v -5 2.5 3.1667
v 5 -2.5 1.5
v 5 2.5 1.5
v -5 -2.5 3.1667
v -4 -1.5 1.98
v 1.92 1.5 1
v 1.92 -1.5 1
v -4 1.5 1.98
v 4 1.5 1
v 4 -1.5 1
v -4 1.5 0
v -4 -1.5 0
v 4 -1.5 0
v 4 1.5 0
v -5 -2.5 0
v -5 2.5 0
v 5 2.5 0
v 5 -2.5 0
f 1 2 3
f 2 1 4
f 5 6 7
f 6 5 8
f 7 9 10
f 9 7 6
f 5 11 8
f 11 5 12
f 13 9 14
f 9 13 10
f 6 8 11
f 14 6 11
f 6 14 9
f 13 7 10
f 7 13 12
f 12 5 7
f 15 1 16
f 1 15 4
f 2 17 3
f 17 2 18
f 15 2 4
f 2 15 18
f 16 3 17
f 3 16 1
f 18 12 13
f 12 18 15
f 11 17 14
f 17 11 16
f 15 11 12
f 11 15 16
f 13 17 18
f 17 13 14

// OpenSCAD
// file: ../p/rect3.scad
use <../lib.scad>
function ldraw_lib__rect3() = [
// 0 Rectangle with 3 Edges
// 0 Name: rect3.dat
// 0 Author: Mark Kennedy [mkennedy]
// 0 !LDRAW_ORG Primitive UPDATE 2010-01
// 0 !LICENSE Licensed under CC BY 4.0 : see CAreadme.txt
// 
// 0 BFC CERTIFY CCW
  [0,"BFC","CERTIFY"],
  [0,"BFC","CCW"],
// 
// 0 !HISTORY 2003-08-01 [PTadmin] Official Update 2003-02
// 0 !HISTORY 2007-06-24 [PTadmin] Header formatted for Contributor Agreement
// 0 !HISTORY 2008-07-01 [PTadmin] Official Update 2008-01
// 0 !HISTORY 2010-01-17 [mikeheide] Change winding to CCW
// 0 !HISTORY 2010-04-05 [PTadmin] Official Update 2010-01
// 
// 
// 2 24 1 0 1 -1 0 1
  [2,24,1,0,1,-1,0,1],
// 2 24 1 0 1 1 0 -1
  [2,24,1,0,1,1,0,-1],
// 2 24 -1 0 1 -1 0 -1
  [2,24,-1,0,1,-1,0,-1],
// 4 16 -1 0 1 -1 0 -1 1 0 -1 1 0 1
  [4,16,-1,0,1,-1,0,-1,1,0,-1,1,0,1],
// 0 //
];
module ldraw_lib__rect3(step=0, col=false, unit=2/5, alt=false, line=0.2, solid=!$preview)
    makepoly(ldraw_lib__rect3(), step=step, col=col, unit=unit, alt=alt, line=line, solid=solid);
ldraw_lib__rect3(line=0.2);
// file: ../p/rect.scad
use <../lib.scad>
function ldraw_lib__rect() = [
// 0 Rectangle
// 0 Name: rect.dat
// 0 Author: James Jessiman
// 0 !LDRAW_ORG Primitive UPDATE 2010-01
// 0 !LICENSE Licensed under CC BY 4.0 : see CAreadme.txt
// 
// 0 BFC CERTIFY CCW
  [0,"BFC","CERTIFY"],
  [0,"BFC","CCW"],
// 
// 0 !HISTORY 2002-04-05 [hafhead] Added BFC statement
// 0 !HISTORY 2002-04-25 [PTadmin] Official Update 2002-02
// 0 !HISTORY 2007-06-24 [PTadmin] Header formatted for Contributor Agreement
// 0 !HISTORY 2008-07-01 [PTadmin] Official Update 2008-01
// 0 !HISTORY 2010-01-17 [mikeheide] changed winding to CCW
// 0 !HISTORY 2010-04-05 [PTadmin] Official Update 2010-01
// 
// 
// 2 24 1 0 1 -1 0 1
  [2,24,1,0,1,-1,0,1],
// 2 24 -1 0 1 -1 0 -1
  [2,24,-1,0,1,-1,0,-1],
// 2 24 -1 0 -1 1 0 -1
  [2,24,-1,0,-1,1,0,-1],
// 2 24 1 0 -1 1 0 1
  [2,24,1,0,-1,1,0,1],
// 4 16 -1 0 1 -1 0 -1 1 0 -1 1 0 1
  [4,16,-1,0,1,-1,0,-1,1,0,-1,1,0,1],
// 0
];
module ldraw_lib__rect(step=0, col=false, unit=2/5, alt=false, line=0.2, solid=!$preview)
    makepoly(ldraw_lib__rect(), step=step, col=col, unit=unit, alt=alt, line=line, solid=solid);
ldraw_lib__rect(line=0.2);
// main file
use <../lib.scad>
use <../p/rect.scad>
use <../p/rect3.scad>
function ldraw_lib__u7034() = [
// 0 Modulex Slope Brick  9  2 x  1 x  0.5
// 0 Name: u7034.dat
// 0 Author: Magnus Forsberg [MagFors]
// 0 !LDRAW_ORG Part UPDATE 2025-09
// 0 !LICENSE Licensed under CC BY 4.0 : see CAreadme.txt
// 
// 0 BFC CERTIFY CCW
  [0,"BFC","CERTIFY"],
  [0,"BFC","CCW"],
// 
// 0 !KEYWORDS 9.4623 degree, Bricklink Mx1561A, Peeron x716, Rebrickable 1561A
// 0 !KEYWORDS slope 1:6
// 
// 0 !HISTORY 2025-06-07 [MagFors] Original design by Tore Eriksson as slp0102a
// 0 !HISTORY 2025-09-29 [OrionP] Official Update 2025-09
// 
// 1 16 0 -5.83335 0 -12.5 0 0 -2.08335 1 0 0 0 -6.25 rect.dat
  [1,16,0,-5.83335,0,-12.5,0,0,-2.08335,1,0,0,0,-6.25, ldraw_lib__rect()],
// 1 16 -2.6 -3.725 0 7.4 0 0 1.225 -1 0 0 0 -3.75 rect.dat
  [1,16,-2.6,-3.725,0,7.4,0,0,1.225,-1,0,0,0,-3.75, ldraw_lib__rect()],
// 1 16 7.4 -2.5 0 0 0 2.6 0 -1 0 3.75 0 0 rect3.dat
  [1,16,7.4,-2.5,0,0,0,2.6,0,-1,0,3.75,0,0, ldraw_lib__rect3()],
// 2 24 -12.5 0 -6.25 12.5 0 -6.25
  [2,24,-12.5,0,-6.25,12.5,0,-6.25],
// 2 24 -12.5 0 6.25 12.5 0 6.25
  [2,24,-12.5,0,6.25,12.5,0,6.25],
// 2 24 -10 0 -3.75 10 0 -3.75
  [2,24,-10,0,-3.75,10,0,-3.75],
// 2 24 -10 0 3.75 10 0 3.75
  [2,24,-10,0,3.75,10,0,3.75],
// 1 16 -10 -2.475 0 0 -1 0 0 0 2.475 -3.75 0 0 rect3.dat
  [1,16,-10,-2.475,0,0,-1,0,0,0,2.475,-3.75,0,0, ldraw_lib__rect3()],
// 1 16 10 -1.25 0 0 1 0 0 0 1.25 3.75 0 0 rect3.dat
  [1,16,10,-1.25,0,0,1,0,0,0,1.25,3.75,0,0, ldraw_lib__rect3()],
// 3 16 4.8 -2.5 3.75 -10 -4.95 3.75 -10 0 3.75
  [3,16,4.8,-2.5,3.75,-10,-4.95,3.75,-10,0,3.75],
// 4 16 10 -2.5 3.75 4.8 -2.5 3.75 -10 0 3.75 10 0 3.75
  [4,16,10,-2.5,3.75,4.8,-2.5,3.75,-10,0,3.75,10,0,3.75],
// 4 16 10 -2.5 -3.75 10 0 -3.75 -10 0 -3.75 4.8 -2.5 -3.75
  [4,16,10,-2.5,-3.75,10,0,-3.75,-10,0,-3.75,4.8,-2.5,-3.75],
// 3 16 -10 0 -3.75 -10 -4.95 -3.75 4.8 -2.5 -3.75
  [3,16,-10,0,-3.75,-10,-4.95,-3.75,4.8,-2.5,-3.75],
// 1 16 -12.5 -3.95835 0 0 1 0 0 0 3.95835 6.25 0 0 rect3.dat
  [1,16,-12.5,-3.95835,0,0,1,0,0,0,3.95835,6.25,0,0, ldraw_lib__rect3()],
// 1 16 12.5 -1.875 0 0 -1 0 0 0 1.875 -6.25 0 0 rect3.dat
  [1,16,12.5,-1.875,0,0,-1,0,0,0,1.875,-6.25,0,0, ldraw_lib__rect3()],
// 4 16 12.5 0 -6.25 12.5 -3.75 -6.25 -12.5 -7.9167 -6.25 -12.5 0 -6.25
  [4,16,12.5,0,-6.25,12.5,-3.75,-6.25,-12.5,-7.9167,-6.25,-12.5,0,-6.25],
// 4 16 -12.5 0 6.25 -12.5 -7.9167 6.25 12.5 -3.75 6.25 12.5 0 6.25
  [4,16,-12.5,0,6.25,-12.5,-7.9167,6.25,12.5,-3.75,6.25,12.5,0,6.25],
// 4 16 -10 0 -3.75 10 0 -3.75 12.5 0 -6.25 -12.5 0 -6.25
  [4,16,-10,0,-3.75,10,0,-3.75,12.5,0,-6.25,-12.5,0,-6.25],
// 4 16 12.5 0 6.25 10 0 3.75 -10 0 3.75 -12.5 0 6.25
  [4,16,12.5,0,6.25,10,0,3.75,-10,0,3.75,-12.5,0,6.25],
// 4 16 -12.5 0 6.25 -10 0 3.75 -10 0 -3.75 -12.5 0 -6.25
  [4,16,-12.5,0,6.25,-10,0,3.75,-10,0,-3.75,-12.5,0,-6.25],
// 4 16 10 0 -3.75 10 0 3.75 12.5 0 6.25 12.5 0 -6.25
  [4,16,10,0,-3.75,10,0,3.75,12.5,0,6.25,12.5,0,-6.25],
];
module ldraw_lib__u7034(step=0, col=false, unit=2/5, alt=false, line=0.2, solid=!$preview)
    makepoly(ldraw_lib__u7034(), step=step, col=col, unit=unit, alt=alt, line=line, solid=solid);
ldraw_lib__u7034(line=0.2);
